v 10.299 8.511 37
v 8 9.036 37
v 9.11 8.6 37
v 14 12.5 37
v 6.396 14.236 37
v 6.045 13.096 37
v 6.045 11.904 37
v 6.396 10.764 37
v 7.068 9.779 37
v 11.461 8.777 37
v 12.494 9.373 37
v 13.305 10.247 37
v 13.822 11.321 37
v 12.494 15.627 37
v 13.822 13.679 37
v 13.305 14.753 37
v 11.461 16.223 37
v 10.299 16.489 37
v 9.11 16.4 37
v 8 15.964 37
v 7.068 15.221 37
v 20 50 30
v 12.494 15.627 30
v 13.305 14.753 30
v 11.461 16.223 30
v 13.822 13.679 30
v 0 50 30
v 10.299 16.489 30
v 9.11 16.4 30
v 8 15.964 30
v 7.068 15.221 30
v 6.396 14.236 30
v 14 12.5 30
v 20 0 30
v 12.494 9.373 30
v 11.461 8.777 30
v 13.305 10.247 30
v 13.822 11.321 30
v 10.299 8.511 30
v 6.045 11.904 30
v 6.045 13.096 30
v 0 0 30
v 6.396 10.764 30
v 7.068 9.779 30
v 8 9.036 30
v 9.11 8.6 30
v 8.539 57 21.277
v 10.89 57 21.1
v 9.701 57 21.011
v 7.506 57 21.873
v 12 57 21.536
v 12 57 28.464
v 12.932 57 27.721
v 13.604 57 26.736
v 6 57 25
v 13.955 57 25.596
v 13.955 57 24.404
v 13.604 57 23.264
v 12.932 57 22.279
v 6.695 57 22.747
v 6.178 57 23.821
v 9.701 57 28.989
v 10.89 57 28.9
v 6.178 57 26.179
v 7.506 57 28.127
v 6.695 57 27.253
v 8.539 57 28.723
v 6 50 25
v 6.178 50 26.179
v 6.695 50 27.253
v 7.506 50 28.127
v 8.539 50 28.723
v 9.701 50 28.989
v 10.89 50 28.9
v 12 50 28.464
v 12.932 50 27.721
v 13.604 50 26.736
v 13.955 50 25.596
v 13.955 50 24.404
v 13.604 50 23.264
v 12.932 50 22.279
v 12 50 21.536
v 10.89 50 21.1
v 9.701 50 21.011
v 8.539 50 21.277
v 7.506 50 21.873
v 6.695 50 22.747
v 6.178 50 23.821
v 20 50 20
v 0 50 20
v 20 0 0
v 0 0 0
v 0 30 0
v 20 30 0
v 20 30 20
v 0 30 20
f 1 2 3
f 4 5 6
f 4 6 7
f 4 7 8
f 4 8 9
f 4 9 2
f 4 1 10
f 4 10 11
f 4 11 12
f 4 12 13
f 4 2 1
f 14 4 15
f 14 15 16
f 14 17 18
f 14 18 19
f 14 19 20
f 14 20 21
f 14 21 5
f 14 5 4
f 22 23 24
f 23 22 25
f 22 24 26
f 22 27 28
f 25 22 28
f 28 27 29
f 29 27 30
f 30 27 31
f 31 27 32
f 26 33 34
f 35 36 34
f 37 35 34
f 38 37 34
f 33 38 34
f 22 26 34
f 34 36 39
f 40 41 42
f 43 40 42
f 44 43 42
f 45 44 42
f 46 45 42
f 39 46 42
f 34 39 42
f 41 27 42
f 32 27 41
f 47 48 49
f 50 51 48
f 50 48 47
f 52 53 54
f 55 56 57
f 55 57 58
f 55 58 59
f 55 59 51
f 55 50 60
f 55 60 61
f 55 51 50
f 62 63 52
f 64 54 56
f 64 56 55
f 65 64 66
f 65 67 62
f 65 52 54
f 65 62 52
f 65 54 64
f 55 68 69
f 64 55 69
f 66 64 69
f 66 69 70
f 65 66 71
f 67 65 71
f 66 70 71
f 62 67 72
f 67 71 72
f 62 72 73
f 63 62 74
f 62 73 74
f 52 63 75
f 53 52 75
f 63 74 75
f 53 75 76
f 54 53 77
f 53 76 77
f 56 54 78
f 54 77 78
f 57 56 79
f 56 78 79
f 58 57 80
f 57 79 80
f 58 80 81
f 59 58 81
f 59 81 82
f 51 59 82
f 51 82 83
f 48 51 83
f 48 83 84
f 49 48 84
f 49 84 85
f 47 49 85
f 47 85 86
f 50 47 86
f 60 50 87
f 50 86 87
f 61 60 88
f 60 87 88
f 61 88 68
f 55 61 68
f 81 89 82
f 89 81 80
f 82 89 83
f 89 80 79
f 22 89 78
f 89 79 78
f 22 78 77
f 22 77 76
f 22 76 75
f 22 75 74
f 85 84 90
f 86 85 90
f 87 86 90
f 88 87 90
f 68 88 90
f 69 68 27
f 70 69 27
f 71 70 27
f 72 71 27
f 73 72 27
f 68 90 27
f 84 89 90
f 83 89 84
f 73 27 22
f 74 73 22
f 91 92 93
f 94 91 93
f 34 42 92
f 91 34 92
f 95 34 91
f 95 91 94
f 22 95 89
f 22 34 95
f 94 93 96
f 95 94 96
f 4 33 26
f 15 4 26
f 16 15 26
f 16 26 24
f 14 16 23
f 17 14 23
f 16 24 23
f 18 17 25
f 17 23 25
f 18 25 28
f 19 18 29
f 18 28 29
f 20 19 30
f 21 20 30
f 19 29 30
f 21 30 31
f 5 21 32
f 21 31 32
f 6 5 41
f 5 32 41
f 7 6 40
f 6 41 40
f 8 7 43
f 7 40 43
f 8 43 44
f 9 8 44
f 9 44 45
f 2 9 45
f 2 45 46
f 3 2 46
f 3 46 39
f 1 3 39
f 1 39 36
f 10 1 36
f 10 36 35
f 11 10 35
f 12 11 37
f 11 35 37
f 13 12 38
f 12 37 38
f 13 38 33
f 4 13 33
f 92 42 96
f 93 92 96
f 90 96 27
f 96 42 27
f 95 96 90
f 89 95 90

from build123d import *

# Parameters (mm, degrees)
F1_DEPTH = 20
F2_R     = 4
F3_DEPTH = 7
F4_R     = 4
F5_DEPTH = 7


with BuildPart() as f1:
    # F0 (on Right) → F1 (new body)
    with BuildSketch(Plane.YZ):
        Polygon((0, 30), (0, 0), (30, 0), (30, 20), (50, 20), (50, 30), align=None)
    extrude(amount=F1_DEPTH)

    # F2 (on face) → F3 (join)
    with BuildSketch(Plane(origin=(0, 50, 0), x_dir=(-1, 0, 0), z_dir=(0, 1, 0))):
        with Locations((-10, 25)):
            Circle(F2_R)
    extrude(amount=F3_DEPTH)

    # F4 (on face) → F5 (join)
    with BuildSketch(Plane.XY.offset(30)):
        with Locations((10, 12.5)):
            Circle(F4_R)
    extrude(amount=F5_DEPTH)


solid = f1.part
